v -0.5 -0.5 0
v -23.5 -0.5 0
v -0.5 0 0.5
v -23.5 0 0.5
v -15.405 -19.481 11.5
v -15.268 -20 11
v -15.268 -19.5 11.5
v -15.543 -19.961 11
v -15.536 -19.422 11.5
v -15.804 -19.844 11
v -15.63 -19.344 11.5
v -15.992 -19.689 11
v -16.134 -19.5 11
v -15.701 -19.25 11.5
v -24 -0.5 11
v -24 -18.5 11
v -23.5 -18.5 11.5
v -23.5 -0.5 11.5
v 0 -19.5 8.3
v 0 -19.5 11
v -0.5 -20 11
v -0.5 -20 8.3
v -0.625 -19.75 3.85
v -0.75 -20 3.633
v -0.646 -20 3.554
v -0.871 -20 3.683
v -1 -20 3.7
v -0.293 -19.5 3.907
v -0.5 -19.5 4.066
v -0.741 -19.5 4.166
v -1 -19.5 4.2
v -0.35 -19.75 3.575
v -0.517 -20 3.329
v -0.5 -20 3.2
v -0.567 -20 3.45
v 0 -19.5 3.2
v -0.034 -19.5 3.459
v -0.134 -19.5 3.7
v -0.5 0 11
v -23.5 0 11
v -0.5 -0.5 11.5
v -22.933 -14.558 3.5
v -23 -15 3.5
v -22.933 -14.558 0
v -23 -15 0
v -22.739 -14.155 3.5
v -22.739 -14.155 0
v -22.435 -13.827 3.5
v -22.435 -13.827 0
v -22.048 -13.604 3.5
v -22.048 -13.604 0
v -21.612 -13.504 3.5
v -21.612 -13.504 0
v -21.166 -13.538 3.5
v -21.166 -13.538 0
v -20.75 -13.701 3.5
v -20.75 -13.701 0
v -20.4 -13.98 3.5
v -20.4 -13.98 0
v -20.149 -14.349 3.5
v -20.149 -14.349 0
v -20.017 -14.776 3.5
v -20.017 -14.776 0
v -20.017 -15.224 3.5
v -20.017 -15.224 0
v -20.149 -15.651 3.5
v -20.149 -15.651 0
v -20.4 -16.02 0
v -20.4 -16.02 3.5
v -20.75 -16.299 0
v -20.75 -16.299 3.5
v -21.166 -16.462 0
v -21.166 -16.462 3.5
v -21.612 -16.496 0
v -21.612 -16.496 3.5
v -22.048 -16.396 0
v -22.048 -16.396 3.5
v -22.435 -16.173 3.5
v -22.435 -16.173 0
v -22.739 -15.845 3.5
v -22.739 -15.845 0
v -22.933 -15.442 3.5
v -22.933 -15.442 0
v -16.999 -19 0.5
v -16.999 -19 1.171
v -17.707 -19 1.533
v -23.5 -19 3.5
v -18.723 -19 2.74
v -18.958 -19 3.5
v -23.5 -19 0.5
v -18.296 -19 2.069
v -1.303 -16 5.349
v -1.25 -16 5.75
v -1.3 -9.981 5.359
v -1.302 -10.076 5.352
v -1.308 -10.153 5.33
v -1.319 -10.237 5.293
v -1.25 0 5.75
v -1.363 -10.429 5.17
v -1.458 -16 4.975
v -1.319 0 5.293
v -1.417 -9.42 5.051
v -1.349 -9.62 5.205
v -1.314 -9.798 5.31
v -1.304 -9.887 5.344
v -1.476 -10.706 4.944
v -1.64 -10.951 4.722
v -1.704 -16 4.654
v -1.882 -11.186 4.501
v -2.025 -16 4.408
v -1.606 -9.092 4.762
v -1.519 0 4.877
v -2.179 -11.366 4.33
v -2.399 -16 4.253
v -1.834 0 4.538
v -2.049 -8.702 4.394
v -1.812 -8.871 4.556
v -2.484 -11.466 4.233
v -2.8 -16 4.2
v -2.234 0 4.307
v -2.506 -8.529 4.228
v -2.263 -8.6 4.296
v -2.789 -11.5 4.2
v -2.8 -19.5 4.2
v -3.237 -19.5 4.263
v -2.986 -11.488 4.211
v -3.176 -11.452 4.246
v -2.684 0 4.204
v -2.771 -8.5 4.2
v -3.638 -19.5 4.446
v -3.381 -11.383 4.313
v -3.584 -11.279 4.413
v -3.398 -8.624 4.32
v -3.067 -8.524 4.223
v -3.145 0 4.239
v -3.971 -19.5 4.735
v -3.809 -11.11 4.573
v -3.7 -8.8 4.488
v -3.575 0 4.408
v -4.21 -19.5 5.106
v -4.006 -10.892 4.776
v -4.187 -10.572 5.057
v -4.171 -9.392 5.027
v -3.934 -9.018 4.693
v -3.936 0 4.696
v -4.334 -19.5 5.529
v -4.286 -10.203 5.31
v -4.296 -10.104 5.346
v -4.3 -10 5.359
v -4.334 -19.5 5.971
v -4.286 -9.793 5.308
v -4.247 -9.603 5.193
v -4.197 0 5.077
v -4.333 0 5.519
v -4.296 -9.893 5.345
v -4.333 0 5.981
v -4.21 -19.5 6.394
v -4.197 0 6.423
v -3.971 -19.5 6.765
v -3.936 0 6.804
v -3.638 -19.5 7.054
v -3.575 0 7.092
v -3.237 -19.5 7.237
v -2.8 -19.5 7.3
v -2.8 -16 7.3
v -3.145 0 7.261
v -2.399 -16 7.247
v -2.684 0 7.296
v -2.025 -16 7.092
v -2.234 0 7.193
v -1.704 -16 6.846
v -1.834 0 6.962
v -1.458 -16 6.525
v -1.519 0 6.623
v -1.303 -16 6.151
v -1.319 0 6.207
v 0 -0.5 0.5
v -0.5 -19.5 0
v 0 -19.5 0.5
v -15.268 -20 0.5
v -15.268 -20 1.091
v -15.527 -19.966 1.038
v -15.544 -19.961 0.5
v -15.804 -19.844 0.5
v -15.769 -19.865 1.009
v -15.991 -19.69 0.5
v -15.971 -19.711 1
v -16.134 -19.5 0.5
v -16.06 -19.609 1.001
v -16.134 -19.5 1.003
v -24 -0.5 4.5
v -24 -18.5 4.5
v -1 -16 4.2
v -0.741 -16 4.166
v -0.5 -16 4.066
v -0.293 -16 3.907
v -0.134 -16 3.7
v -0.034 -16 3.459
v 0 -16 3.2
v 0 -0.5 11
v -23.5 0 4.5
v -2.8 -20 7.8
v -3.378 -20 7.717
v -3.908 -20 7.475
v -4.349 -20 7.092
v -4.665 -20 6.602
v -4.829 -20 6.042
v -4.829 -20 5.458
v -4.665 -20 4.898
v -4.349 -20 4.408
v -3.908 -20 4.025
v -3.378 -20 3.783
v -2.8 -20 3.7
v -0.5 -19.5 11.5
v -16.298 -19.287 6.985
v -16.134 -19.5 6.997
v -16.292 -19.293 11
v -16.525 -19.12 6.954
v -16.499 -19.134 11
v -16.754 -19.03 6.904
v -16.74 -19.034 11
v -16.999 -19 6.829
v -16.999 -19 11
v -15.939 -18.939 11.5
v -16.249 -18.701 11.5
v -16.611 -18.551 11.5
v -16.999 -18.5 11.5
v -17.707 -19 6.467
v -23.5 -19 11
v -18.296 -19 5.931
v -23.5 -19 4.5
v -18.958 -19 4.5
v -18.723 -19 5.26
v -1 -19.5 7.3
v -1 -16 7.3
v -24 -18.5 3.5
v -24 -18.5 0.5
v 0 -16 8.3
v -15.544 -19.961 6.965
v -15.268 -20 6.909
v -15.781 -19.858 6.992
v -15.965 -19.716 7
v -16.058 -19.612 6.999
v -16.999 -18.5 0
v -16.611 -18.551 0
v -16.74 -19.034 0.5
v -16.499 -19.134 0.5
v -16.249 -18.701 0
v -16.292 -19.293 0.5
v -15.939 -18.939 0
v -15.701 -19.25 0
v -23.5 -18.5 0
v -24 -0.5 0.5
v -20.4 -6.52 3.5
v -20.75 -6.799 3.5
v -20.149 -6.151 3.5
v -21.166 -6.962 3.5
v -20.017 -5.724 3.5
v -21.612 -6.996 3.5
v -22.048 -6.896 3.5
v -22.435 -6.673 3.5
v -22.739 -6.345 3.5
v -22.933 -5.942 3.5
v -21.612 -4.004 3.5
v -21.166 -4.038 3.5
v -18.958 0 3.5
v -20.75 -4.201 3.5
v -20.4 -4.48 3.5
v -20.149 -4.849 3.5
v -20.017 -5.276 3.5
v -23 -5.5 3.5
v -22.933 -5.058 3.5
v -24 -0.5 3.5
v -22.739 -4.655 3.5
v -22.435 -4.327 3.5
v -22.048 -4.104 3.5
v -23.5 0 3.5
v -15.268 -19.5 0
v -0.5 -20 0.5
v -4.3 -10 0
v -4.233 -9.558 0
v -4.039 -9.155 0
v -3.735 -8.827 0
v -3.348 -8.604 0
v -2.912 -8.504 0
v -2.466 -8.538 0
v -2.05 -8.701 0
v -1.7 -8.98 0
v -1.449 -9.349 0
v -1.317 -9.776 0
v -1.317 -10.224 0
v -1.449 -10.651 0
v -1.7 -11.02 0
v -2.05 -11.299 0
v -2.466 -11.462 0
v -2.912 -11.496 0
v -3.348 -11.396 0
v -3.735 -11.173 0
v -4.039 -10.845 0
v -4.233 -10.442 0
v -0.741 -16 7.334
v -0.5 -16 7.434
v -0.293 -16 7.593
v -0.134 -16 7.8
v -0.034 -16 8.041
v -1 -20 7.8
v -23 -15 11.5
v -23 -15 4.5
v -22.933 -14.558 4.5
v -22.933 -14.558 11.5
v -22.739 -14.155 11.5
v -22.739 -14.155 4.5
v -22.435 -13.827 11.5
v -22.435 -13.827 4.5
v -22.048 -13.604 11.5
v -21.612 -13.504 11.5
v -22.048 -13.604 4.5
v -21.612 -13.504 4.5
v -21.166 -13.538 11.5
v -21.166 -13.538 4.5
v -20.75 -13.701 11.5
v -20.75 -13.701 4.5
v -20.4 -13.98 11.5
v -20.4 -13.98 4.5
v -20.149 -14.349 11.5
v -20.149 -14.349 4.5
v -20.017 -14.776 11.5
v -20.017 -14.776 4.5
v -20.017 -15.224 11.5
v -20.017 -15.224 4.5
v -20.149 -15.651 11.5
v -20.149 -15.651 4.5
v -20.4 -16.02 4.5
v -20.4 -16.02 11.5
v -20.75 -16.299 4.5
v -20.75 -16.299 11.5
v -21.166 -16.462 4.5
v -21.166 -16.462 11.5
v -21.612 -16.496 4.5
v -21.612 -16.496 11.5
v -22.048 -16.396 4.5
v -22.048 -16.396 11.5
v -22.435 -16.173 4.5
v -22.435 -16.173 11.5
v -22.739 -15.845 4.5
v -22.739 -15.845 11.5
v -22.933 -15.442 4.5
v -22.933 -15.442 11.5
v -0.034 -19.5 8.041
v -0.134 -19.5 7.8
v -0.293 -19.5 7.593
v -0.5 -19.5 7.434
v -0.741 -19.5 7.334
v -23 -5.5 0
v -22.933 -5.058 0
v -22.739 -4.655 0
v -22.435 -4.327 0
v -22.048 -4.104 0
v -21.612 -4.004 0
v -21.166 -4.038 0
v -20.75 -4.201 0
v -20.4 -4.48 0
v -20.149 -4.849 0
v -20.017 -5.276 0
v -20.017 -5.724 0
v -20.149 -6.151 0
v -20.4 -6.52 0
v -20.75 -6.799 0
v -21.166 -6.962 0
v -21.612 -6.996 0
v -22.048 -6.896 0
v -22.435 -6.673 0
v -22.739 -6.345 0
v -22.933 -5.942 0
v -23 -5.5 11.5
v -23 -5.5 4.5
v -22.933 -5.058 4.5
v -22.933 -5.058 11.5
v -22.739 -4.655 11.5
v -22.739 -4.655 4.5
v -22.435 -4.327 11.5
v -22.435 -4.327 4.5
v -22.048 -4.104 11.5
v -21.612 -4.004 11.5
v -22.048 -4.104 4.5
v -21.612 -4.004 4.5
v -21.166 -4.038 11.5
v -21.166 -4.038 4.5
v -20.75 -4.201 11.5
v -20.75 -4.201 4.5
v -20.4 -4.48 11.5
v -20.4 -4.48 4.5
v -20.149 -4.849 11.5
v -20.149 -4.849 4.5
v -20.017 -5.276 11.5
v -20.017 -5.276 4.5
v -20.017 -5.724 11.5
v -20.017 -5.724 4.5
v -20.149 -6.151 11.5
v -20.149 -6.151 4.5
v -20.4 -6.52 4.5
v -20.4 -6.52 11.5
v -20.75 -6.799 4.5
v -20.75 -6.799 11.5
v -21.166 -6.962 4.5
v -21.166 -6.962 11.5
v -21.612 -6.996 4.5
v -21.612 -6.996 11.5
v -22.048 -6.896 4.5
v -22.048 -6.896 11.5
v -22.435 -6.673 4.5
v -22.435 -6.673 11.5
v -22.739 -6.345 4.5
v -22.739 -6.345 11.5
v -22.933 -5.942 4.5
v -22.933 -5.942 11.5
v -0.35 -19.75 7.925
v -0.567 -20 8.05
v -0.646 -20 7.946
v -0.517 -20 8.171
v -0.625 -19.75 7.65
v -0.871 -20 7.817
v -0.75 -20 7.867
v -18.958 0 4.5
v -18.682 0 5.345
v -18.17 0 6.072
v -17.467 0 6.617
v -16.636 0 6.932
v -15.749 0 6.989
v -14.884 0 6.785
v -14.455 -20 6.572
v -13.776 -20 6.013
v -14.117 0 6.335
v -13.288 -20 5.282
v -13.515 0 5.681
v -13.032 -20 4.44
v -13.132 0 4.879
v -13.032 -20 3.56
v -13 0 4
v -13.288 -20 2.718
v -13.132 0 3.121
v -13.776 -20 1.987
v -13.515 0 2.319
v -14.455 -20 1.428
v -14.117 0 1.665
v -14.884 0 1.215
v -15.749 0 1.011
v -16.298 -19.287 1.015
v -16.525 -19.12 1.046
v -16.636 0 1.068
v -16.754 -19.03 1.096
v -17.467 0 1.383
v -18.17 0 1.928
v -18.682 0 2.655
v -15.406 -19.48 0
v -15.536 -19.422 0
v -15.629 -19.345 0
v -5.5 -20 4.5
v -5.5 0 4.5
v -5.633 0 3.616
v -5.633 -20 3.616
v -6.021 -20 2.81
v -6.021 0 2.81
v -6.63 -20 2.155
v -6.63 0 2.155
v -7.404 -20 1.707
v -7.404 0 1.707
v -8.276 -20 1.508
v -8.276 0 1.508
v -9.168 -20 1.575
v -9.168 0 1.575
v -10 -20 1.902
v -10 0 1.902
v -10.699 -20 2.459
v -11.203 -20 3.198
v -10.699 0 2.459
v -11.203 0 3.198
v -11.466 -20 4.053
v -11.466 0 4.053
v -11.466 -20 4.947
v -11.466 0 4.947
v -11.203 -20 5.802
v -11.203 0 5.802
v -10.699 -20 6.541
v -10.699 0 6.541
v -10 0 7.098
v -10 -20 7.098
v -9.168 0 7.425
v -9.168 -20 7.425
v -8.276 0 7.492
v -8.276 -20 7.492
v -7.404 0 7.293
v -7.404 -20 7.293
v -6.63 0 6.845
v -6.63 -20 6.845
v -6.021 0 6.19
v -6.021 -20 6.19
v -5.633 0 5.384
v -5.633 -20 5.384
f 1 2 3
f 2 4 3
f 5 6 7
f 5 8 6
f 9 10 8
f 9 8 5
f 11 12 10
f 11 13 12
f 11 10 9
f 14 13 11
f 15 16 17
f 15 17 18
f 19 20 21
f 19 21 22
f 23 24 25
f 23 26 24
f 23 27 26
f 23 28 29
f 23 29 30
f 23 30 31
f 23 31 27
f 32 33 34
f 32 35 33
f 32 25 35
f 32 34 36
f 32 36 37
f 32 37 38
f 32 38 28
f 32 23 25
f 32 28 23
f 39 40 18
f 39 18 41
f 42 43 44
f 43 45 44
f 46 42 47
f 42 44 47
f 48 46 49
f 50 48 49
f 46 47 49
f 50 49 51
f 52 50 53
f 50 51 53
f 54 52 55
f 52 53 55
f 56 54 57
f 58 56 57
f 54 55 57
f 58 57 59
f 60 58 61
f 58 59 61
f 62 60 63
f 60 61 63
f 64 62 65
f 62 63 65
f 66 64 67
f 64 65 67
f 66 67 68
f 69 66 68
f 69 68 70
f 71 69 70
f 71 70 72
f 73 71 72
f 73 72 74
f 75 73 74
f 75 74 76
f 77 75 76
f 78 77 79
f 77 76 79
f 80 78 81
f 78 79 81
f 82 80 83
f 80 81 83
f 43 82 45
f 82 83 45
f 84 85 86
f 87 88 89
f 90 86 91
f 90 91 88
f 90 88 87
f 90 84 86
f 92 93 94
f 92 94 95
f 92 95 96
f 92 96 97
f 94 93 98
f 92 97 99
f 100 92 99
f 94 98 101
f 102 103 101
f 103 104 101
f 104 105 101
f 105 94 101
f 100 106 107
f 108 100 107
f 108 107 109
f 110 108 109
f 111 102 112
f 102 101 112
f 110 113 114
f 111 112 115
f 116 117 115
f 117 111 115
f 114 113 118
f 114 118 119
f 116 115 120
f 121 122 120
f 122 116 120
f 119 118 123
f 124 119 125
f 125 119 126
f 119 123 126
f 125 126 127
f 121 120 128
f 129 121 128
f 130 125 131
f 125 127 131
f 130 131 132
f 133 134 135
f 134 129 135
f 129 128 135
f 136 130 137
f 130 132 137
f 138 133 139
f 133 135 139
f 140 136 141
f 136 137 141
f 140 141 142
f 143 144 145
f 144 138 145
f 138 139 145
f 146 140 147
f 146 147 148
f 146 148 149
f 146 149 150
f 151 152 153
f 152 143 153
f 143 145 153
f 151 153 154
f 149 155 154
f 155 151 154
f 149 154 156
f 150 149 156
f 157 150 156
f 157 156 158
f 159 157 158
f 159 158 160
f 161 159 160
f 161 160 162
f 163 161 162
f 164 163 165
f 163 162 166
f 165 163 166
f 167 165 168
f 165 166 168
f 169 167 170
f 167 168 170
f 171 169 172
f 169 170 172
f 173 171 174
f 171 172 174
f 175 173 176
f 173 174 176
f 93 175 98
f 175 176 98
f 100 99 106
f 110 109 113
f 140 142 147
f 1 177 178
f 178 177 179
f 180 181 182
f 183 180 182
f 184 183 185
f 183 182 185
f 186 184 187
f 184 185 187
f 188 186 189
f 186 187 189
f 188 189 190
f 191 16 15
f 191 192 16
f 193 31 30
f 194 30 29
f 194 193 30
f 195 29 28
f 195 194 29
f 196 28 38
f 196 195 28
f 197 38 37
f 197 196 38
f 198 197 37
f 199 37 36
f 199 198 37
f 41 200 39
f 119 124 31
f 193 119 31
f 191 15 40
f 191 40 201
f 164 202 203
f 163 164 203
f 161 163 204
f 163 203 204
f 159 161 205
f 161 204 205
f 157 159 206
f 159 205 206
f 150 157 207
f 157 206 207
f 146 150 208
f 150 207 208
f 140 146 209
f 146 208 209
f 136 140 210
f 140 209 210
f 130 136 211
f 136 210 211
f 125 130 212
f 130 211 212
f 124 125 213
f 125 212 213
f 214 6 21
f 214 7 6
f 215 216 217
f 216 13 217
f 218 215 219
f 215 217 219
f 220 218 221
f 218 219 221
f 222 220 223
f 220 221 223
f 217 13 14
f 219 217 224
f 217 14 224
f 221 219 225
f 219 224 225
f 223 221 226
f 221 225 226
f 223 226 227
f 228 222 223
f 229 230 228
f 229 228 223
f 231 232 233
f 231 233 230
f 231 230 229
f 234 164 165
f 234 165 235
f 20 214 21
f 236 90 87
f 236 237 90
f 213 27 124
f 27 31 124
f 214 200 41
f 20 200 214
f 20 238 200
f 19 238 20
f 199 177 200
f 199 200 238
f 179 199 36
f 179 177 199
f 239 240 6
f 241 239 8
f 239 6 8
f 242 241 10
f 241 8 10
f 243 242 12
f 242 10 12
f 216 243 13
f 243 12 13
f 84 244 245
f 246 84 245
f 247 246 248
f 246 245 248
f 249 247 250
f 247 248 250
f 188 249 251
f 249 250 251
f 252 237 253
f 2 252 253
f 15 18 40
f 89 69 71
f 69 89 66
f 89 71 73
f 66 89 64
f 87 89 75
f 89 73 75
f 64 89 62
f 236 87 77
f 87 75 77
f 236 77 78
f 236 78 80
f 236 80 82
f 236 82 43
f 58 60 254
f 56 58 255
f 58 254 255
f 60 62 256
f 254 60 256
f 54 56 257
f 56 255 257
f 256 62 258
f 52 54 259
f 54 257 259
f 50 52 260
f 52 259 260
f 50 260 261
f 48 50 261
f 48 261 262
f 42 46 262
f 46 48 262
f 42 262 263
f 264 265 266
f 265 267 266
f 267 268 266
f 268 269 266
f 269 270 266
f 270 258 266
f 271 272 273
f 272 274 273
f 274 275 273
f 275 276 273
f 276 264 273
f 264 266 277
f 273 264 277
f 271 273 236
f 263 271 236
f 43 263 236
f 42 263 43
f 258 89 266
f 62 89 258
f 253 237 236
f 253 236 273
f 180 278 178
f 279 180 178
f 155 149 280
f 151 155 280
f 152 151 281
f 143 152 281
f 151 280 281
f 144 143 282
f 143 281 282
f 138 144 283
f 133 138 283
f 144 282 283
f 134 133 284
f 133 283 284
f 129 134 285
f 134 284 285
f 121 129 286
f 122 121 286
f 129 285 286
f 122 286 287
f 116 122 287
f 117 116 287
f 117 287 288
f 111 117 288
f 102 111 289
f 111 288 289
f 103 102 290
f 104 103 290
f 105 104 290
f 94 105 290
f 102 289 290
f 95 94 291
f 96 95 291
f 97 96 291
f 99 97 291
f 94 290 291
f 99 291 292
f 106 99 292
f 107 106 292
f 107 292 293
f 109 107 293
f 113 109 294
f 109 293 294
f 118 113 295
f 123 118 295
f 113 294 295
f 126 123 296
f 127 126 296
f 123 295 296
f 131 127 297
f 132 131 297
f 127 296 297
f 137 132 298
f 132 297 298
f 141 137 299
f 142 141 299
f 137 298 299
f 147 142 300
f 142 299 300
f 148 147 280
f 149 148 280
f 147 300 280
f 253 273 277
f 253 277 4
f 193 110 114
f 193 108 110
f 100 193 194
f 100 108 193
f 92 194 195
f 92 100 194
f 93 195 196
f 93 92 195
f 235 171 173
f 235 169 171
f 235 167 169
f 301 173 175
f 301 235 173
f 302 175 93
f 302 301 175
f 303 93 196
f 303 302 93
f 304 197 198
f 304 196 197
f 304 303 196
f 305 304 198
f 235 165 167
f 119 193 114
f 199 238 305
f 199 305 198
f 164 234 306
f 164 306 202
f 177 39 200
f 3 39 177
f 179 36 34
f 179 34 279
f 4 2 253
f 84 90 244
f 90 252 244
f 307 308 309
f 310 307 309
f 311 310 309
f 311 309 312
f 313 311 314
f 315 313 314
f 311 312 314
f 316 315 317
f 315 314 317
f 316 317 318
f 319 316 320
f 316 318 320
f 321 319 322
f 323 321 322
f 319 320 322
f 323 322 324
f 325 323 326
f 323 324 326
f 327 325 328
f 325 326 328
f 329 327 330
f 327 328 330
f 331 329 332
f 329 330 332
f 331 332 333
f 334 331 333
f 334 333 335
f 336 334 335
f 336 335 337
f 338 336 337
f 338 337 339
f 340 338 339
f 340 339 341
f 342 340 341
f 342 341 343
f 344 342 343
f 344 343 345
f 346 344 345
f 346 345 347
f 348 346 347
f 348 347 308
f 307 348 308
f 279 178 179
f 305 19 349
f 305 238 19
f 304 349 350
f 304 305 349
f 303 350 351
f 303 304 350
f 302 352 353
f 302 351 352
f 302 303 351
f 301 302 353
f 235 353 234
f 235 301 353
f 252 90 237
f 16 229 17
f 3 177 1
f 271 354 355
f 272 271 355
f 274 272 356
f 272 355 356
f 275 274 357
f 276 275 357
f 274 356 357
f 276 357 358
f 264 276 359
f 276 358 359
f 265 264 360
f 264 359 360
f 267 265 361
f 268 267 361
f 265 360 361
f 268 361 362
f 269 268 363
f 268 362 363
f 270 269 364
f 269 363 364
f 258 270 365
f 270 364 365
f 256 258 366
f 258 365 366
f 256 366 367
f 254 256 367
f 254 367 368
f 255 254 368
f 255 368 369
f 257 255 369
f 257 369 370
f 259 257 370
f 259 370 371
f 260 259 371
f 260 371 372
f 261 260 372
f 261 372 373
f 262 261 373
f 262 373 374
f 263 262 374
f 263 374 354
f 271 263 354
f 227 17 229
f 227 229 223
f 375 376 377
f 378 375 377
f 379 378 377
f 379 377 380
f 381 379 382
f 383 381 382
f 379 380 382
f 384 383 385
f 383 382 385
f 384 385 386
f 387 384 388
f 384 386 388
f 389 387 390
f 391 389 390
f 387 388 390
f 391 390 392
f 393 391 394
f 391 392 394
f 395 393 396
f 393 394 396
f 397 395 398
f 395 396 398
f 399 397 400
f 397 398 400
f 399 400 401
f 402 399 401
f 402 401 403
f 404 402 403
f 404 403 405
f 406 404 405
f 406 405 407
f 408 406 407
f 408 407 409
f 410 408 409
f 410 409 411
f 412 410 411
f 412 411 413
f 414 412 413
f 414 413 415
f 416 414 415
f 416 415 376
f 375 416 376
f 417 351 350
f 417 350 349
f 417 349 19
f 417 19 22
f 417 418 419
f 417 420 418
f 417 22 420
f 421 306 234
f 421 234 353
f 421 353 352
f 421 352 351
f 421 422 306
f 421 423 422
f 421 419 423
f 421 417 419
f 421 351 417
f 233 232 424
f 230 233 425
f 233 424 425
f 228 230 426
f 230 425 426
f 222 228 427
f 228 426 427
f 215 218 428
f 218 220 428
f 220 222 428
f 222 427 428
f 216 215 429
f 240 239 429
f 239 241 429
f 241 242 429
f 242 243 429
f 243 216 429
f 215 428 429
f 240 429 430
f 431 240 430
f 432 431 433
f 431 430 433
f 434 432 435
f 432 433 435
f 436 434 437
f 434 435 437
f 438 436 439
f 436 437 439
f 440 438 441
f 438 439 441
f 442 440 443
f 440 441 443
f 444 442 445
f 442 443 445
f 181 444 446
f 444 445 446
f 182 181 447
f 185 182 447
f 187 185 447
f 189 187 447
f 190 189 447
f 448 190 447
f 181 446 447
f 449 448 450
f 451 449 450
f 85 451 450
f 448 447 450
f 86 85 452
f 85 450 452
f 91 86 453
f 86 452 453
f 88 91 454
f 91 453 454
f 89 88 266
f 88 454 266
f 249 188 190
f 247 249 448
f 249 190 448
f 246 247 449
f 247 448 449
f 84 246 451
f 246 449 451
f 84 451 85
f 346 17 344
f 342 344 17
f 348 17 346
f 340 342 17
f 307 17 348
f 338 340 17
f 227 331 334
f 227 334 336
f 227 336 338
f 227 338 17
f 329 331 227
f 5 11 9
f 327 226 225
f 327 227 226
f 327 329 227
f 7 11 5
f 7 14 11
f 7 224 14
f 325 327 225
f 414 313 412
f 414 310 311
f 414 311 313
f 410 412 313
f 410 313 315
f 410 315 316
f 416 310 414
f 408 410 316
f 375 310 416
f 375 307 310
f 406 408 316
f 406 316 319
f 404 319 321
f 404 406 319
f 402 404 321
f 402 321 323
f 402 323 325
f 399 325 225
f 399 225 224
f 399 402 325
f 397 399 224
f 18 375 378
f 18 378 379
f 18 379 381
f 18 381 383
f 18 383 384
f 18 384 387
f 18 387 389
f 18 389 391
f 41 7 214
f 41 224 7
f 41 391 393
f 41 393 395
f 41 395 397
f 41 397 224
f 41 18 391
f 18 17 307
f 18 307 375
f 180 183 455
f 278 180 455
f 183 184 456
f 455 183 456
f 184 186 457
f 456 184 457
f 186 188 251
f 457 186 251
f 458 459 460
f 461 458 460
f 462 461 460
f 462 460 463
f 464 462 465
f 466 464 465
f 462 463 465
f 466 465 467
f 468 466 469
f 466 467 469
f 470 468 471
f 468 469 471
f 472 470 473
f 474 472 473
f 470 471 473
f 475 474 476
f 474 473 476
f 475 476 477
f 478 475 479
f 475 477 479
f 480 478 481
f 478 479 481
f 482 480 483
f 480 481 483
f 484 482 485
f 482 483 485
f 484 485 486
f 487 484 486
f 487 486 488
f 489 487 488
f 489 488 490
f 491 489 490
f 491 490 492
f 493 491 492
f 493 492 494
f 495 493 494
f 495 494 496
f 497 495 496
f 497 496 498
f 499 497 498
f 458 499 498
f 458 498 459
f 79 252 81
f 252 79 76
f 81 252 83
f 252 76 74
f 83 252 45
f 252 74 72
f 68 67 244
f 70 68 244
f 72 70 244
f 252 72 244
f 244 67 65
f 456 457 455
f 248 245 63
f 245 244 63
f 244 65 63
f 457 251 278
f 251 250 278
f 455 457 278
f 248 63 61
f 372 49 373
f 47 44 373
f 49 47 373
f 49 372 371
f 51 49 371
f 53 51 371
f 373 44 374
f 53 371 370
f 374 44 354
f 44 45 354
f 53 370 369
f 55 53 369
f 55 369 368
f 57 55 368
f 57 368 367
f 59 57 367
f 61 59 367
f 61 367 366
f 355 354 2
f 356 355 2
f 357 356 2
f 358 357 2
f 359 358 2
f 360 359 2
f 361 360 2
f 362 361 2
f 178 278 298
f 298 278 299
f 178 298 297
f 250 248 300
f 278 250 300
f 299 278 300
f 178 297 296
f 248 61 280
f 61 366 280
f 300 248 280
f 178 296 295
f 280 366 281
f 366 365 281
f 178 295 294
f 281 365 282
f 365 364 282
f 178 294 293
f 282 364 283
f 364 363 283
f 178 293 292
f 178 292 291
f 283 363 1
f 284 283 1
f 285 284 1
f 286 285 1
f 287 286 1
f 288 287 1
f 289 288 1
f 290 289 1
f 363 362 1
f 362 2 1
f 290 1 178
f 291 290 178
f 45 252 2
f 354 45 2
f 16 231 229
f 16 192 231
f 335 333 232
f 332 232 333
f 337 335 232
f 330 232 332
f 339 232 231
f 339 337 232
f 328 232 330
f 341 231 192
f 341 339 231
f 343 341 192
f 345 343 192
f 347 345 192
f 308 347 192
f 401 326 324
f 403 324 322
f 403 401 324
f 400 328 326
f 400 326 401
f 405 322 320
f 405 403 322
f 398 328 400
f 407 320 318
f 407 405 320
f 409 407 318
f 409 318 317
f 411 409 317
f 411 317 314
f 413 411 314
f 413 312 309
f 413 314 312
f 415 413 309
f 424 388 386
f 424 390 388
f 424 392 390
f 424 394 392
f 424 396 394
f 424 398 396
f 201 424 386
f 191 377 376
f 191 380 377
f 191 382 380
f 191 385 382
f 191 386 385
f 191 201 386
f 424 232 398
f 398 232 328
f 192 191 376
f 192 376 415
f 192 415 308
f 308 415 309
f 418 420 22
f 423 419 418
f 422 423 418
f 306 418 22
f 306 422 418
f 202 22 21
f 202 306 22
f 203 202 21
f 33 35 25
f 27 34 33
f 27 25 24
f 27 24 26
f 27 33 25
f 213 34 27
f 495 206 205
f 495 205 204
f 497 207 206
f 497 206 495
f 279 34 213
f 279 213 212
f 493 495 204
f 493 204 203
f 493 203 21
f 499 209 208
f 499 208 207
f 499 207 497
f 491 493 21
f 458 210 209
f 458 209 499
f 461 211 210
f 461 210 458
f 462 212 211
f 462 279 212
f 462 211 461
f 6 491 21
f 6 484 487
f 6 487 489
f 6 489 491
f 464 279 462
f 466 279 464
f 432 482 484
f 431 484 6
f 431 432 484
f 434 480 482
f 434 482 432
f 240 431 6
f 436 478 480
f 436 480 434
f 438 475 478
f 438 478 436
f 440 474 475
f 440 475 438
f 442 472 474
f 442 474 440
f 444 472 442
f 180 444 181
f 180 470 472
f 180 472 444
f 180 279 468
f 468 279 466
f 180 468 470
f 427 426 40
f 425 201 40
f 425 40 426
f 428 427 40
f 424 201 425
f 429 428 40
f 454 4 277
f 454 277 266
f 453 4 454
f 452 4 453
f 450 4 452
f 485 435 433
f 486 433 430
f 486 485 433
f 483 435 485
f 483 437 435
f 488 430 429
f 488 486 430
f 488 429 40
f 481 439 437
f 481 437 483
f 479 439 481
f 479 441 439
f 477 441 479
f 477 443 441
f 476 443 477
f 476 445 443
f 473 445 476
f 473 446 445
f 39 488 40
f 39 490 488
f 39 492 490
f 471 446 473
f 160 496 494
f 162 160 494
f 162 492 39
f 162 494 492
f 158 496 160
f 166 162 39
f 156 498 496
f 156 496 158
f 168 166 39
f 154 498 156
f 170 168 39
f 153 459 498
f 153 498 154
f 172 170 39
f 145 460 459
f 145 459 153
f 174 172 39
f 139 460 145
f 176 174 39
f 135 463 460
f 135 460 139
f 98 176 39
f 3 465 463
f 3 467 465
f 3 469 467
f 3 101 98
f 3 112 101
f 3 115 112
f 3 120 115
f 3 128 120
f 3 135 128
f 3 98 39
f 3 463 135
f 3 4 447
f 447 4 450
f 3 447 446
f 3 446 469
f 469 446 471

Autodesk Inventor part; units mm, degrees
ref_plane "YZ Plane" through (0, 0, 0) normal (1, 0, 0) x (0, 1, 0)
ref_plane "XZ Plane" through (0, 0, 0) normal (0, 1, 0) x (-1, 0, 0)
ref_plane "XY Plane" through (0, 0, 0) normal (0, 0, 1) x (1, 0, 0)
sketch "Skizze1" plane through (0, 0, 0) normal (0, 0, 1) x (1, 0, 0)
  line L0 (0, 0) -> (0, -20)
  line L1 (0, -20) -> (-16, -20)
  line L2 (-16, -20) -> (-16, -19)
  line L3 (-16, -19) -> (-24, -19)
  line L4 (-24, -19) -> (-24, 0)
  line L5 (-24, 0) -> (0, 0)
  dimension "d0" = 20
  dimension "d1" = 16
  dimension "d2" = 1
  dimension "d3" = 8
extrude "Main Body" add sketch "Skizze1" along normal blind 11.5
sketch "Skizze2" plane through (-24, 0, 0) normal (0, 1, 0) x (1, 0, 0)
  arc A0 (5.042, -4.5) -> (5.042, -3.5) centre (8, -4) ccw
  line L0 (0, 0) -> (0, -11.5) projected
  line L1 (24, -11.5) -> (0, -11.5) projected
  line L2 (5.042, -3.5) -> (0, -3.5)
  line L3 (5.042, -4.5) -> (0, -4.5)
  line L4 (0, -3.5) -> (0, -4.5)
  circle A1 centre (15.5, -4.5) radius 3
  circle A2 centre (21.2, -5.75) radius 1.55
  line L5 (0, 0) -> (24, 0) projected
  dimension "d6" = 8
  dimension "d7" = 3
  dimension "d9" = 1
  dimension "d10" = 0.5
  dimension "d11" = 6
  dimension "d13" = 15.5
  dimension "d14" = 3.1
  dimension "d15" = 21.2
  dimension "d19" = 4
  dimension "d20" = 4.5
  dimension "d21" = 5.75
extrude "Insert Holes" cut sketch "Skizze2" against normal through all
sketch "Skizze3" plane through (-16, -20, 0) normal (0, -1, 0) x (1, 0, 0)
  circle A0 centre (13.2, 5.75) radius 1.55 projected
  line L0 (13.2, 7.3) -> (16, 7.3)
  line L1 (13.2, 4.2) -> (16, 4.2)
  line L2 (16, 0) -> (16, 11.5) projected
  line L3 (16, 4.2) -> (16, 7.3)
  line L4 (13.2, 7.3) -> (13.2, 4.2)
extrude "Cable Opening" cut sketch "Skizze3" against normal blind 4 contours A0 L0 L2 L1
fillet "Rundung1" radius 1 6 edges at (-16, -19, 9.25) (-16, -19, 0.5) (0, -18, 7.3) (0, -18, 4.2) (-16, -20, 9.25) (-16, -20, 0.5)
sketch "Skizze4" plane through (0, 0, 0) normal (0, 0, -1) x (-1, 0, 0)
  circle A0 centre (21.5, -15) radius 1.5
  circle A1 centre (21.5, -5.5) radius 1.5
  line L0 (24, -19) -> (24, 0) projected
  line L1 (24, 0) -> (0, 0) projected
  dimension "d25" = 3
  dimension "d26" = 3
  dimension "d27" = 2.5
  dimension "d28" = 2.5
  dimension "d29" = 5.5
  dimension "d30" = 15
extrude "Cartridge clamping holes" cut sketch "Skizze4" against normal through all
sketch "Skizze5" plane through (0, 0, 0) normal (0, 0, -1) x (-1, 0, 0)
  circle A0 centre (2.8, -10) radius 1.5
  line L0 (24, -19) -> (24, 0) projected
  line L1 (24, 0) -> (0, 0) projected
  dimension "d33" = 3
  dimension "d34" = 21.2
  dimension "d35" = 10
extrude "PT100 clamping holes" cut sketch "Skizze5" against normal up to next
chamfer "Fase1" distance 0.5 angle 45 24 edges at (0, -10, 11.5) (-7.6338, -20, 11.5) (-15.7677, -19.866, 11.5) (-20.4995, -19, 11.5) (-7.6338, -20, 0) (-15.7677, -19.866, 0) (-20.4995, -19, 0) (0, -10, 0) (0, 0, 5.75) (-12, 0, 11.5) (-24, -19, 8) (-24, -9.5, 11.5) (-24, -19, 1.75) (0, -20, 9.9) (-0.2929, -20, 7.5929) (-1.9, -20, 7.3) (-4.35, -20, 5.75) (-1.9, -20, 4.2) (-0.2929, -20, 3.9071) (0, -20, 1.6) (-12, 0, 0) (-24, -9.5, 0) (-24, 0, 1.75) (-24, 0, 8)
thread "Gewinde1" size "M6x1" class "6H" standard "ANSI Metric M Profile" full length
thread "Gewinde2" size "M3x0.5" class "6H" standard "ANSI Metric M Profile" full length
thread "Gewinde3" size "M3x0.5" class "6H" standard "ANSI Metric M Profile" full length
thread "Gewinde4" size "M3x0.5" class "6H" standard "ANSI Metric M Profile" full length
properties part number "E3D-v6 Volcano Heater Block" material "Aluminium 6061"
